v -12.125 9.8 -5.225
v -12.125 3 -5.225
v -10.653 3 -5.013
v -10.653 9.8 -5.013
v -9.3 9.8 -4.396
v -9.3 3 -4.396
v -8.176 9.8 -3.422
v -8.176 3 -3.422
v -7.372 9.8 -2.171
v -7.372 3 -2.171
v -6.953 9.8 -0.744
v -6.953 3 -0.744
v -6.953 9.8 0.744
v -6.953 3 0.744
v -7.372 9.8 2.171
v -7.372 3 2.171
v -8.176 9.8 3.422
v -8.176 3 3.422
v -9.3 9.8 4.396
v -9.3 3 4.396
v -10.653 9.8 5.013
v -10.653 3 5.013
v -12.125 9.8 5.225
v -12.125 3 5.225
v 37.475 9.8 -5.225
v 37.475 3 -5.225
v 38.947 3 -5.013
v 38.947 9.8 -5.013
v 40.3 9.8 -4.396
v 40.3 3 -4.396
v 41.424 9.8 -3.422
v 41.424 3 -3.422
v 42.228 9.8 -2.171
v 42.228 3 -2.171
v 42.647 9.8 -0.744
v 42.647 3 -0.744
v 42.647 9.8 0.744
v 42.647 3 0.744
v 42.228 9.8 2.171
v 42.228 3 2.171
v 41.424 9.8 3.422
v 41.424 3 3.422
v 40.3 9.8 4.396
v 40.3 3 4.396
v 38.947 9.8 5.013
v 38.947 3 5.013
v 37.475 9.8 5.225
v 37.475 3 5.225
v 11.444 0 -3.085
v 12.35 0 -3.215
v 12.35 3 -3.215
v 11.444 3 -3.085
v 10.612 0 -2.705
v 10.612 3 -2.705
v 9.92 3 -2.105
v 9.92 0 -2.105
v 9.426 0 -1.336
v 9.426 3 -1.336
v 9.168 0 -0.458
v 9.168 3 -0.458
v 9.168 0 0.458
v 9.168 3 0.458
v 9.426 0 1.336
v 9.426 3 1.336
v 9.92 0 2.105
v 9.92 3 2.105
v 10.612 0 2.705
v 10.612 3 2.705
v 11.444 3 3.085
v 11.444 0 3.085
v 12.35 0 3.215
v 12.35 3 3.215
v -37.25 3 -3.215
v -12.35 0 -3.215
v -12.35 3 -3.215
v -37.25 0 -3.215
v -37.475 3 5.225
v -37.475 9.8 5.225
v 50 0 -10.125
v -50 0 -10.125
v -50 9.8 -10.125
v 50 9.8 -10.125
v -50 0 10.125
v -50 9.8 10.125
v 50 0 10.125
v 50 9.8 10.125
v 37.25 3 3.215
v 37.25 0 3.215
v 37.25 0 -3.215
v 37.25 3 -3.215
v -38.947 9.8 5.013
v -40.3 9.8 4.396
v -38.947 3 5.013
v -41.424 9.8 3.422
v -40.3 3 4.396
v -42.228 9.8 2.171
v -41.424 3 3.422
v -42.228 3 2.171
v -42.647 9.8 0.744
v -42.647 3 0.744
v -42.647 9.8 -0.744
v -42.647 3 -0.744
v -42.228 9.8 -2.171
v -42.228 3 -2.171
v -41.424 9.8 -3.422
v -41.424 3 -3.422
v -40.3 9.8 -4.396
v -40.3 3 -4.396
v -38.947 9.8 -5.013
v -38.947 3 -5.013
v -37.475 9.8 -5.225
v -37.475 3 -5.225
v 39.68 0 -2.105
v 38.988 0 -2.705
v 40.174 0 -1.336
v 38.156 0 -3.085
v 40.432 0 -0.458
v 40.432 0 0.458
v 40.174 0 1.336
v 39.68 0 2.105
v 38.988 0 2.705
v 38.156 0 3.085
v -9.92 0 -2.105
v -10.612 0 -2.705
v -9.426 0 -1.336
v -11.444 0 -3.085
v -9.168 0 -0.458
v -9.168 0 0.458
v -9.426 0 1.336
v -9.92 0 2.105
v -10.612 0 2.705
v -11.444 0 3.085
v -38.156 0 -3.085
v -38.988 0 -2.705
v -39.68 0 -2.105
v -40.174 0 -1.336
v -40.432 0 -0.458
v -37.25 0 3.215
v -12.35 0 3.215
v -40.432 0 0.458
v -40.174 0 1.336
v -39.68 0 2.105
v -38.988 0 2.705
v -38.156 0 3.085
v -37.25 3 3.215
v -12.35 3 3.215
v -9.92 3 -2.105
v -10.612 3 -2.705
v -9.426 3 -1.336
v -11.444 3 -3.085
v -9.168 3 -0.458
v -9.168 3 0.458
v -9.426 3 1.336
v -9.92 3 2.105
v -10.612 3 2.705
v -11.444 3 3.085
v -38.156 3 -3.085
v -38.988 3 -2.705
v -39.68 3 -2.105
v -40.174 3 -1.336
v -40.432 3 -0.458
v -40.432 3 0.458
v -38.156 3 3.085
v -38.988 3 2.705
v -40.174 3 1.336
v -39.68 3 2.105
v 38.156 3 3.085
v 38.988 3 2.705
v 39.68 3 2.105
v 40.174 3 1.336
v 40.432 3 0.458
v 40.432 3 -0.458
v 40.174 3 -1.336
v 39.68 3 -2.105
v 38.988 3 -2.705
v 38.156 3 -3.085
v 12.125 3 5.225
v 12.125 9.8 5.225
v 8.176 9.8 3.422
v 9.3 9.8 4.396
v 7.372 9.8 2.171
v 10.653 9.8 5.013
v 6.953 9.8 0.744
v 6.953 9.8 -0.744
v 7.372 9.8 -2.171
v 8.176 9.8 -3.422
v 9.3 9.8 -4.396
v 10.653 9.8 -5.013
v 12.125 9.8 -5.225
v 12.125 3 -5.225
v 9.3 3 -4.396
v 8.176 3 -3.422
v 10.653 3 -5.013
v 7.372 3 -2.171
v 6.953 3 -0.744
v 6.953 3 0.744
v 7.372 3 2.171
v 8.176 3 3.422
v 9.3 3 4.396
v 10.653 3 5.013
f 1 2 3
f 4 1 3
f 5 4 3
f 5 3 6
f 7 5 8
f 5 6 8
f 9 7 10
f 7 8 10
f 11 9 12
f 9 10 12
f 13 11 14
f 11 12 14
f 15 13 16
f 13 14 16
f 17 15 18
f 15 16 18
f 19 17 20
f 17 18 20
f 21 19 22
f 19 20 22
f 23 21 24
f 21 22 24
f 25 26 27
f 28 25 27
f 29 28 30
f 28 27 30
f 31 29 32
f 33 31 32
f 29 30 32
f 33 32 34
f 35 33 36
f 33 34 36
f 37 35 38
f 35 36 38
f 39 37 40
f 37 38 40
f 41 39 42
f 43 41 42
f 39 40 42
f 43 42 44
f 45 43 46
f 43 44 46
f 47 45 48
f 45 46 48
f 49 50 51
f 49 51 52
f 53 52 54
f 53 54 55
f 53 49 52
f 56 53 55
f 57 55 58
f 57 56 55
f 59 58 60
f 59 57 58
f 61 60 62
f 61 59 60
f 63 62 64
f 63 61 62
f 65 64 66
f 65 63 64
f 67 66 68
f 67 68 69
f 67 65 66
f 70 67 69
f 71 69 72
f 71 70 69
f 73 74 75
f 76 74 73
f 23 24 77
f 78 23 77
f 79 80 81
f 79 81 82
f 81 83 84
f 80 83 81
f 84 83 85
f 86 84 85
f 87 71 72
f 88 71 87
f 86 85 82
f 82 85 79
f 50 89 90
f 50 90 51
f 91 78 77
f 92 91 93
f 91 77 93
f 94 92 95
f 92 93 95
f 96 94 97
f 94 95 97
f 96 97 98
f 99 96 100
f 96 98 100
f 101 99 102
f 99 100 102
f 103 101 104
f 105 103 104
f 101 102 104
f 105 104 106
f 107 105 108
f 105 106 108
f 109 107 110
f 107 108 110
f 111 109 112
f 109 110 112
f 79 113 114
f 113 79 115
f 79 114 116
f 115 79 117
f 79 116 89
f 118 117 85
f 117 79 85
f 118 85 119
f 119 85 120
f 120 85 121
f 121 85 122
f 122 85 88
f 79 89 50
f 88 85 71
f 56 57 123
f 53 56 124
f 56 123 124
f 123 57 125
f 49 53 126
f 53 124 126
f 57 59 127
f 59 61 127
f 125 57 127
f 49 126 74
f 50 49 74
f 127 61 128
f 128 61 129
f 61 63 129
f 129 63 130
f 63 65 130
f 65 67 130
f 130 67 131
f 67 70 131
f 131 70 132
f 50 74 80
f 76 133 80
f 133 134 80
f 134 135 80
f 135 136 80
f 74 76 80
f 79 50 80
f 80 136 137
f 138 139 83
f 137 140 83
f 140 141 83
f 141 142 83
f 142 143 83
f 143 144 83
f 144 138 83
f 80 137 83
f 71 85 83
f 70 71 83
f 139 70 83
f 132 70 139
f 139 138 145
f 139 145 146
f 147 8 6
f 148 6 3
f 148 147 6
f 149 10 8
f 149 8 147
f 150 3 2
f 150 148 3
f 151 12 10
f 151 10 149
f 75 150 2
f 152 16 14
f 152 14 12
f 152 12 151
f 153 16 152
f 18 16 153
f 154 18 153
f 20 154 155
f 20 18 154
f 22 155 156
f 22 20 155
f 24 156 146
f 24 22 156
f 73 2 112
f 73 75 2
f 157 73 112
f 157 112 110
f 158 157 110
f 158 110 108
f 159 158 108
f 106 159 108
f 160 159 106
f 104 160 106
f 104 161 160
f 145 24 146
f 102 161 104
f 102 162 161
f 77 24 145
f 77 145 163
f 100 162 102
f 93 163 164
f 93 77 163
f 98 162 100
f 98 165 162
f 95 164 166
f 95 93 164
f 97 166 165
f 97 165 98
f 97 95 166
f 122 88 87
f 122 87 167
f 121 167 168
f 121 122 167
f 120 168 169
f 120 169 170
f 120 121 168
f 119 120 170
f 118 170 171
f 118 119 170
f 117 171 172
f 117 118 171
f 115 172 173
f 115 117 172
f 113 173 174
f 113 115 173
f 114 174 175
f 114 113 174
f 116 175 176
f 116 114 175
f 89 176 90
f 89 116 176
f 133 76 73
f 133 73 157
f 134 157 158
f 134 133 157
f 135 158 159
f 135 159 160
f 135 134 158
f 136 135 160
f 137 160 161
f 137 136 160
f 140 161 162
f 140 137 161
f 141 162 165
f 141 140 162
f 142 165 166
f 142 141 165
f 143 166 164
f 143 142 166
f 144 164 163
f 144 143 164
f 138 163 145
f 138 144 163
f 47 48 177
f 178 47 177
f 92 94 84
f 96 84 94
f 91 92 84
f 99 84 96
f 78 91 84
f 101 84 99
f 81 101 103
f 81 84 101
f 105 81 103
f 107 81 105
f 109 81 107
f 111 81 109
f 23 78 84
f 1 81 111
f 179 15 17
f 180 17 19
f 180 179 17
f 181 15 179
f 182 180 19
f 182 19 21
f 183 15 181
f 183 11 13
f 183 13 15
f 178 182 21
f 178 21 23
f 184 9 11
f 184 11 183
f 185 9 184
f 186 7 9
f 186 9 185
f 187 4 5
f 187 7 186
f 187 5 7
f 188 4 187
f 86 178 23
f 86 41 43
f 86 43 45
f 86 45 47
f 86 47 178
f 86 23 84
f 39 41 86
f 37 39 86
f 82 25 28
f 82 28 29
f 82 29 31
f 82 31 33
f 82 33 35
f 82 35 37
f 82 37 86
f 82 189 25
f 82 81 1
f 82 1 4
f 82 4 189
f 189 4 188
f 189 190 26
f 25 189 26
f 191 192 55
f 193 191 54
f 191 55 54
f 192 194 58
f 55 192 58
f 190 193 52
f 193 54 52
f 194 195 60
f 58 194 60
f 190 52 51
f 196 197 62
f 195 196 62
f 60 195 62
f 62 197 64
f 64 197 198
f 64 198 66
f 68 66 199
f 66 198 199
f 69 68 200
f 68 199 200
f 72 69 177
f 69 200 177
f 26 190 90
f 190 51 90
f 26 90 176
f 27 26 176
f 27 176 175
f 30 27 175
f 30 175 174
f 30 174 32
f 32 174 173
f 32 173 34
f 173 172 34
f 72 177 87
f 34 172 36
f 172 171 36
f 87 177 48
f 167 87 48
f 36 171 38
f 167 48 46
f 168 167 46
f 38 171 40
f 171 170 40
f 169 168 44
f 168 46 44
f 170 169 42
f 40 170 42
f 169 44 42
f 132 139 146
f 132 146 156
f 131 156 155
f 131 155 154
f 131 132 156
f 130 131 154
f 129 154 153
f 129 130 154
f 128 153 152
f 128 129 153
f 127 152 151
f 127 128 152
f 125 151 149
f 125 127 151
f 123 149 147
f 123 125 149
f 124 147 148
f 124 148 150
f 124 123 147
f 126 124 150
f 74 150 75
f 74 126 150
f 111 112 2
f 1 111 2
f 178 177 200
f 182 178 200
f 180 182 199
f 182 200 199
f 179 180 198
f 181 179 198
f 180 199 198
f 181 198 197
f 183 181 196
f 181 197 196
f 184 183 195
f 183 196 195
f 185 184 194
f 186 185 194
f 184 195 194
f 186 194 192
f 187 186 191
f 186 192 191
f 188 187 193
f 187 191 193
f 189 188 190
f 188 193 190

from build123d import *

# Parameters (mm, degrees)
SKETCH_2_W          = 100
SKETCH_2_H          = 20.25
EXTRUDE_2_DEPTH     = 9.8
CUT_EXTRUDE_4_DEPTH = 9.8
EXTRUDE_3_DEPTH     = 3


with BuildPart() as part:
    # 草图2 → 凸台-拉伸2 (new body)
    with BuildSketch(Plane(origin=(0, 0, 0), x_dir=(1, 0, 0), z_dir=(0, 1, 0))):
        Rectangle(SKETCH_2_W, SKETCH_2_H)
    extrude(amount=EXTRUDE_2_DEPTH)

    # 草图6 → 切除-拉伸4 (cut)
    with BuildSketch(Plane(origin=(0, 0, 0), x_dir=(1, 0, 0), z_dir=(0, 1, 0))):
        with BuildLine():
            Line((-37.475, 5.225), (-12.125, 5.225))
            ThreePointArc((-12.125, 5.225), (-6.9, 0), (-12.125, -5.225))
            Line((-12.125, -5.225), (-37.475, -5.225))
            ThreePointArc((-37.475, -5.225), (-42.7, 0), (-37.475, 5.225))
        make_face()
        with BuildLine():
            Line((37.475, -5.225), (12.125, -5.225))
            ThreePointArc((12.125, -5.225), (6.9, 0), (12.125, 5.225))
            Line((12.125, 5.225), (37.475, 5.225))
            ThreePointArc((37.475, 5.225), (42.7, 0), (37.475, -5.225))
        make_face()
    extrude(amount=CUT_EXTRUDE_4_DEPTH, mode=Mode.SUBTRACT)

    # 草图8 → 凸台-拉伸3 (add)
    with BuildSketch(Plane.XZ):
        with BuildLine():
            Line((-37.475, 5.225), (-12.125, 5.225))
            ThreePointArc((-12.125, 5.225), (-6.9, 0), (-12.125, -5.225))
            Line((-12.125, -5.225), (-37.475, -5.225))
            ThreePointArc((-37.475, -5.225), (-42.7, 0), (-37.475, 5.225))
        make_face()
        with BuildLine():
            Line((-37.25, 3.215), (-12.35, 3.215))
            ThreePointArc((-12.35, 3.215), (-9.135, 0), (-12.35, -3.215))
            Line((-12.35, -3.215), (-37.25, -3.215))
            ThreePointArc((-37.25, -3.215), (-40.465, 0), (-37.25, 3.215))
        make_face(mode=Mode.SUBTRACT)
        with BuildLine():
            Line((37.475, 5.225), (12.125, 5.225))
            ThreePointArc((12.125, 5.225), (6.9, 0), (12.125, -5.225))
            Line((12.125, -5.225), (37.475, -5.225))
            ThreePointArc((37.475, -5.225), (42.7, 0), (37.475, 5.225))
        make_face()
        with BuildLine():
            Line((37.25, -3.215), (12.35, -3.215))
            ThreePointArc((12.35, -3.215), (9.135, 0), (12.35, 3.215))
            Line((12.35, 3.215), (37.25, 3.215))
            ThreePointArc((37.25, 3.215), (40.465, 0), (37.25, -3.215))
        make_face(mode=Mode.SUBTRACT)
    extrude(amount=-EXTRUDE_3_DEPTH)


solid = part.part
